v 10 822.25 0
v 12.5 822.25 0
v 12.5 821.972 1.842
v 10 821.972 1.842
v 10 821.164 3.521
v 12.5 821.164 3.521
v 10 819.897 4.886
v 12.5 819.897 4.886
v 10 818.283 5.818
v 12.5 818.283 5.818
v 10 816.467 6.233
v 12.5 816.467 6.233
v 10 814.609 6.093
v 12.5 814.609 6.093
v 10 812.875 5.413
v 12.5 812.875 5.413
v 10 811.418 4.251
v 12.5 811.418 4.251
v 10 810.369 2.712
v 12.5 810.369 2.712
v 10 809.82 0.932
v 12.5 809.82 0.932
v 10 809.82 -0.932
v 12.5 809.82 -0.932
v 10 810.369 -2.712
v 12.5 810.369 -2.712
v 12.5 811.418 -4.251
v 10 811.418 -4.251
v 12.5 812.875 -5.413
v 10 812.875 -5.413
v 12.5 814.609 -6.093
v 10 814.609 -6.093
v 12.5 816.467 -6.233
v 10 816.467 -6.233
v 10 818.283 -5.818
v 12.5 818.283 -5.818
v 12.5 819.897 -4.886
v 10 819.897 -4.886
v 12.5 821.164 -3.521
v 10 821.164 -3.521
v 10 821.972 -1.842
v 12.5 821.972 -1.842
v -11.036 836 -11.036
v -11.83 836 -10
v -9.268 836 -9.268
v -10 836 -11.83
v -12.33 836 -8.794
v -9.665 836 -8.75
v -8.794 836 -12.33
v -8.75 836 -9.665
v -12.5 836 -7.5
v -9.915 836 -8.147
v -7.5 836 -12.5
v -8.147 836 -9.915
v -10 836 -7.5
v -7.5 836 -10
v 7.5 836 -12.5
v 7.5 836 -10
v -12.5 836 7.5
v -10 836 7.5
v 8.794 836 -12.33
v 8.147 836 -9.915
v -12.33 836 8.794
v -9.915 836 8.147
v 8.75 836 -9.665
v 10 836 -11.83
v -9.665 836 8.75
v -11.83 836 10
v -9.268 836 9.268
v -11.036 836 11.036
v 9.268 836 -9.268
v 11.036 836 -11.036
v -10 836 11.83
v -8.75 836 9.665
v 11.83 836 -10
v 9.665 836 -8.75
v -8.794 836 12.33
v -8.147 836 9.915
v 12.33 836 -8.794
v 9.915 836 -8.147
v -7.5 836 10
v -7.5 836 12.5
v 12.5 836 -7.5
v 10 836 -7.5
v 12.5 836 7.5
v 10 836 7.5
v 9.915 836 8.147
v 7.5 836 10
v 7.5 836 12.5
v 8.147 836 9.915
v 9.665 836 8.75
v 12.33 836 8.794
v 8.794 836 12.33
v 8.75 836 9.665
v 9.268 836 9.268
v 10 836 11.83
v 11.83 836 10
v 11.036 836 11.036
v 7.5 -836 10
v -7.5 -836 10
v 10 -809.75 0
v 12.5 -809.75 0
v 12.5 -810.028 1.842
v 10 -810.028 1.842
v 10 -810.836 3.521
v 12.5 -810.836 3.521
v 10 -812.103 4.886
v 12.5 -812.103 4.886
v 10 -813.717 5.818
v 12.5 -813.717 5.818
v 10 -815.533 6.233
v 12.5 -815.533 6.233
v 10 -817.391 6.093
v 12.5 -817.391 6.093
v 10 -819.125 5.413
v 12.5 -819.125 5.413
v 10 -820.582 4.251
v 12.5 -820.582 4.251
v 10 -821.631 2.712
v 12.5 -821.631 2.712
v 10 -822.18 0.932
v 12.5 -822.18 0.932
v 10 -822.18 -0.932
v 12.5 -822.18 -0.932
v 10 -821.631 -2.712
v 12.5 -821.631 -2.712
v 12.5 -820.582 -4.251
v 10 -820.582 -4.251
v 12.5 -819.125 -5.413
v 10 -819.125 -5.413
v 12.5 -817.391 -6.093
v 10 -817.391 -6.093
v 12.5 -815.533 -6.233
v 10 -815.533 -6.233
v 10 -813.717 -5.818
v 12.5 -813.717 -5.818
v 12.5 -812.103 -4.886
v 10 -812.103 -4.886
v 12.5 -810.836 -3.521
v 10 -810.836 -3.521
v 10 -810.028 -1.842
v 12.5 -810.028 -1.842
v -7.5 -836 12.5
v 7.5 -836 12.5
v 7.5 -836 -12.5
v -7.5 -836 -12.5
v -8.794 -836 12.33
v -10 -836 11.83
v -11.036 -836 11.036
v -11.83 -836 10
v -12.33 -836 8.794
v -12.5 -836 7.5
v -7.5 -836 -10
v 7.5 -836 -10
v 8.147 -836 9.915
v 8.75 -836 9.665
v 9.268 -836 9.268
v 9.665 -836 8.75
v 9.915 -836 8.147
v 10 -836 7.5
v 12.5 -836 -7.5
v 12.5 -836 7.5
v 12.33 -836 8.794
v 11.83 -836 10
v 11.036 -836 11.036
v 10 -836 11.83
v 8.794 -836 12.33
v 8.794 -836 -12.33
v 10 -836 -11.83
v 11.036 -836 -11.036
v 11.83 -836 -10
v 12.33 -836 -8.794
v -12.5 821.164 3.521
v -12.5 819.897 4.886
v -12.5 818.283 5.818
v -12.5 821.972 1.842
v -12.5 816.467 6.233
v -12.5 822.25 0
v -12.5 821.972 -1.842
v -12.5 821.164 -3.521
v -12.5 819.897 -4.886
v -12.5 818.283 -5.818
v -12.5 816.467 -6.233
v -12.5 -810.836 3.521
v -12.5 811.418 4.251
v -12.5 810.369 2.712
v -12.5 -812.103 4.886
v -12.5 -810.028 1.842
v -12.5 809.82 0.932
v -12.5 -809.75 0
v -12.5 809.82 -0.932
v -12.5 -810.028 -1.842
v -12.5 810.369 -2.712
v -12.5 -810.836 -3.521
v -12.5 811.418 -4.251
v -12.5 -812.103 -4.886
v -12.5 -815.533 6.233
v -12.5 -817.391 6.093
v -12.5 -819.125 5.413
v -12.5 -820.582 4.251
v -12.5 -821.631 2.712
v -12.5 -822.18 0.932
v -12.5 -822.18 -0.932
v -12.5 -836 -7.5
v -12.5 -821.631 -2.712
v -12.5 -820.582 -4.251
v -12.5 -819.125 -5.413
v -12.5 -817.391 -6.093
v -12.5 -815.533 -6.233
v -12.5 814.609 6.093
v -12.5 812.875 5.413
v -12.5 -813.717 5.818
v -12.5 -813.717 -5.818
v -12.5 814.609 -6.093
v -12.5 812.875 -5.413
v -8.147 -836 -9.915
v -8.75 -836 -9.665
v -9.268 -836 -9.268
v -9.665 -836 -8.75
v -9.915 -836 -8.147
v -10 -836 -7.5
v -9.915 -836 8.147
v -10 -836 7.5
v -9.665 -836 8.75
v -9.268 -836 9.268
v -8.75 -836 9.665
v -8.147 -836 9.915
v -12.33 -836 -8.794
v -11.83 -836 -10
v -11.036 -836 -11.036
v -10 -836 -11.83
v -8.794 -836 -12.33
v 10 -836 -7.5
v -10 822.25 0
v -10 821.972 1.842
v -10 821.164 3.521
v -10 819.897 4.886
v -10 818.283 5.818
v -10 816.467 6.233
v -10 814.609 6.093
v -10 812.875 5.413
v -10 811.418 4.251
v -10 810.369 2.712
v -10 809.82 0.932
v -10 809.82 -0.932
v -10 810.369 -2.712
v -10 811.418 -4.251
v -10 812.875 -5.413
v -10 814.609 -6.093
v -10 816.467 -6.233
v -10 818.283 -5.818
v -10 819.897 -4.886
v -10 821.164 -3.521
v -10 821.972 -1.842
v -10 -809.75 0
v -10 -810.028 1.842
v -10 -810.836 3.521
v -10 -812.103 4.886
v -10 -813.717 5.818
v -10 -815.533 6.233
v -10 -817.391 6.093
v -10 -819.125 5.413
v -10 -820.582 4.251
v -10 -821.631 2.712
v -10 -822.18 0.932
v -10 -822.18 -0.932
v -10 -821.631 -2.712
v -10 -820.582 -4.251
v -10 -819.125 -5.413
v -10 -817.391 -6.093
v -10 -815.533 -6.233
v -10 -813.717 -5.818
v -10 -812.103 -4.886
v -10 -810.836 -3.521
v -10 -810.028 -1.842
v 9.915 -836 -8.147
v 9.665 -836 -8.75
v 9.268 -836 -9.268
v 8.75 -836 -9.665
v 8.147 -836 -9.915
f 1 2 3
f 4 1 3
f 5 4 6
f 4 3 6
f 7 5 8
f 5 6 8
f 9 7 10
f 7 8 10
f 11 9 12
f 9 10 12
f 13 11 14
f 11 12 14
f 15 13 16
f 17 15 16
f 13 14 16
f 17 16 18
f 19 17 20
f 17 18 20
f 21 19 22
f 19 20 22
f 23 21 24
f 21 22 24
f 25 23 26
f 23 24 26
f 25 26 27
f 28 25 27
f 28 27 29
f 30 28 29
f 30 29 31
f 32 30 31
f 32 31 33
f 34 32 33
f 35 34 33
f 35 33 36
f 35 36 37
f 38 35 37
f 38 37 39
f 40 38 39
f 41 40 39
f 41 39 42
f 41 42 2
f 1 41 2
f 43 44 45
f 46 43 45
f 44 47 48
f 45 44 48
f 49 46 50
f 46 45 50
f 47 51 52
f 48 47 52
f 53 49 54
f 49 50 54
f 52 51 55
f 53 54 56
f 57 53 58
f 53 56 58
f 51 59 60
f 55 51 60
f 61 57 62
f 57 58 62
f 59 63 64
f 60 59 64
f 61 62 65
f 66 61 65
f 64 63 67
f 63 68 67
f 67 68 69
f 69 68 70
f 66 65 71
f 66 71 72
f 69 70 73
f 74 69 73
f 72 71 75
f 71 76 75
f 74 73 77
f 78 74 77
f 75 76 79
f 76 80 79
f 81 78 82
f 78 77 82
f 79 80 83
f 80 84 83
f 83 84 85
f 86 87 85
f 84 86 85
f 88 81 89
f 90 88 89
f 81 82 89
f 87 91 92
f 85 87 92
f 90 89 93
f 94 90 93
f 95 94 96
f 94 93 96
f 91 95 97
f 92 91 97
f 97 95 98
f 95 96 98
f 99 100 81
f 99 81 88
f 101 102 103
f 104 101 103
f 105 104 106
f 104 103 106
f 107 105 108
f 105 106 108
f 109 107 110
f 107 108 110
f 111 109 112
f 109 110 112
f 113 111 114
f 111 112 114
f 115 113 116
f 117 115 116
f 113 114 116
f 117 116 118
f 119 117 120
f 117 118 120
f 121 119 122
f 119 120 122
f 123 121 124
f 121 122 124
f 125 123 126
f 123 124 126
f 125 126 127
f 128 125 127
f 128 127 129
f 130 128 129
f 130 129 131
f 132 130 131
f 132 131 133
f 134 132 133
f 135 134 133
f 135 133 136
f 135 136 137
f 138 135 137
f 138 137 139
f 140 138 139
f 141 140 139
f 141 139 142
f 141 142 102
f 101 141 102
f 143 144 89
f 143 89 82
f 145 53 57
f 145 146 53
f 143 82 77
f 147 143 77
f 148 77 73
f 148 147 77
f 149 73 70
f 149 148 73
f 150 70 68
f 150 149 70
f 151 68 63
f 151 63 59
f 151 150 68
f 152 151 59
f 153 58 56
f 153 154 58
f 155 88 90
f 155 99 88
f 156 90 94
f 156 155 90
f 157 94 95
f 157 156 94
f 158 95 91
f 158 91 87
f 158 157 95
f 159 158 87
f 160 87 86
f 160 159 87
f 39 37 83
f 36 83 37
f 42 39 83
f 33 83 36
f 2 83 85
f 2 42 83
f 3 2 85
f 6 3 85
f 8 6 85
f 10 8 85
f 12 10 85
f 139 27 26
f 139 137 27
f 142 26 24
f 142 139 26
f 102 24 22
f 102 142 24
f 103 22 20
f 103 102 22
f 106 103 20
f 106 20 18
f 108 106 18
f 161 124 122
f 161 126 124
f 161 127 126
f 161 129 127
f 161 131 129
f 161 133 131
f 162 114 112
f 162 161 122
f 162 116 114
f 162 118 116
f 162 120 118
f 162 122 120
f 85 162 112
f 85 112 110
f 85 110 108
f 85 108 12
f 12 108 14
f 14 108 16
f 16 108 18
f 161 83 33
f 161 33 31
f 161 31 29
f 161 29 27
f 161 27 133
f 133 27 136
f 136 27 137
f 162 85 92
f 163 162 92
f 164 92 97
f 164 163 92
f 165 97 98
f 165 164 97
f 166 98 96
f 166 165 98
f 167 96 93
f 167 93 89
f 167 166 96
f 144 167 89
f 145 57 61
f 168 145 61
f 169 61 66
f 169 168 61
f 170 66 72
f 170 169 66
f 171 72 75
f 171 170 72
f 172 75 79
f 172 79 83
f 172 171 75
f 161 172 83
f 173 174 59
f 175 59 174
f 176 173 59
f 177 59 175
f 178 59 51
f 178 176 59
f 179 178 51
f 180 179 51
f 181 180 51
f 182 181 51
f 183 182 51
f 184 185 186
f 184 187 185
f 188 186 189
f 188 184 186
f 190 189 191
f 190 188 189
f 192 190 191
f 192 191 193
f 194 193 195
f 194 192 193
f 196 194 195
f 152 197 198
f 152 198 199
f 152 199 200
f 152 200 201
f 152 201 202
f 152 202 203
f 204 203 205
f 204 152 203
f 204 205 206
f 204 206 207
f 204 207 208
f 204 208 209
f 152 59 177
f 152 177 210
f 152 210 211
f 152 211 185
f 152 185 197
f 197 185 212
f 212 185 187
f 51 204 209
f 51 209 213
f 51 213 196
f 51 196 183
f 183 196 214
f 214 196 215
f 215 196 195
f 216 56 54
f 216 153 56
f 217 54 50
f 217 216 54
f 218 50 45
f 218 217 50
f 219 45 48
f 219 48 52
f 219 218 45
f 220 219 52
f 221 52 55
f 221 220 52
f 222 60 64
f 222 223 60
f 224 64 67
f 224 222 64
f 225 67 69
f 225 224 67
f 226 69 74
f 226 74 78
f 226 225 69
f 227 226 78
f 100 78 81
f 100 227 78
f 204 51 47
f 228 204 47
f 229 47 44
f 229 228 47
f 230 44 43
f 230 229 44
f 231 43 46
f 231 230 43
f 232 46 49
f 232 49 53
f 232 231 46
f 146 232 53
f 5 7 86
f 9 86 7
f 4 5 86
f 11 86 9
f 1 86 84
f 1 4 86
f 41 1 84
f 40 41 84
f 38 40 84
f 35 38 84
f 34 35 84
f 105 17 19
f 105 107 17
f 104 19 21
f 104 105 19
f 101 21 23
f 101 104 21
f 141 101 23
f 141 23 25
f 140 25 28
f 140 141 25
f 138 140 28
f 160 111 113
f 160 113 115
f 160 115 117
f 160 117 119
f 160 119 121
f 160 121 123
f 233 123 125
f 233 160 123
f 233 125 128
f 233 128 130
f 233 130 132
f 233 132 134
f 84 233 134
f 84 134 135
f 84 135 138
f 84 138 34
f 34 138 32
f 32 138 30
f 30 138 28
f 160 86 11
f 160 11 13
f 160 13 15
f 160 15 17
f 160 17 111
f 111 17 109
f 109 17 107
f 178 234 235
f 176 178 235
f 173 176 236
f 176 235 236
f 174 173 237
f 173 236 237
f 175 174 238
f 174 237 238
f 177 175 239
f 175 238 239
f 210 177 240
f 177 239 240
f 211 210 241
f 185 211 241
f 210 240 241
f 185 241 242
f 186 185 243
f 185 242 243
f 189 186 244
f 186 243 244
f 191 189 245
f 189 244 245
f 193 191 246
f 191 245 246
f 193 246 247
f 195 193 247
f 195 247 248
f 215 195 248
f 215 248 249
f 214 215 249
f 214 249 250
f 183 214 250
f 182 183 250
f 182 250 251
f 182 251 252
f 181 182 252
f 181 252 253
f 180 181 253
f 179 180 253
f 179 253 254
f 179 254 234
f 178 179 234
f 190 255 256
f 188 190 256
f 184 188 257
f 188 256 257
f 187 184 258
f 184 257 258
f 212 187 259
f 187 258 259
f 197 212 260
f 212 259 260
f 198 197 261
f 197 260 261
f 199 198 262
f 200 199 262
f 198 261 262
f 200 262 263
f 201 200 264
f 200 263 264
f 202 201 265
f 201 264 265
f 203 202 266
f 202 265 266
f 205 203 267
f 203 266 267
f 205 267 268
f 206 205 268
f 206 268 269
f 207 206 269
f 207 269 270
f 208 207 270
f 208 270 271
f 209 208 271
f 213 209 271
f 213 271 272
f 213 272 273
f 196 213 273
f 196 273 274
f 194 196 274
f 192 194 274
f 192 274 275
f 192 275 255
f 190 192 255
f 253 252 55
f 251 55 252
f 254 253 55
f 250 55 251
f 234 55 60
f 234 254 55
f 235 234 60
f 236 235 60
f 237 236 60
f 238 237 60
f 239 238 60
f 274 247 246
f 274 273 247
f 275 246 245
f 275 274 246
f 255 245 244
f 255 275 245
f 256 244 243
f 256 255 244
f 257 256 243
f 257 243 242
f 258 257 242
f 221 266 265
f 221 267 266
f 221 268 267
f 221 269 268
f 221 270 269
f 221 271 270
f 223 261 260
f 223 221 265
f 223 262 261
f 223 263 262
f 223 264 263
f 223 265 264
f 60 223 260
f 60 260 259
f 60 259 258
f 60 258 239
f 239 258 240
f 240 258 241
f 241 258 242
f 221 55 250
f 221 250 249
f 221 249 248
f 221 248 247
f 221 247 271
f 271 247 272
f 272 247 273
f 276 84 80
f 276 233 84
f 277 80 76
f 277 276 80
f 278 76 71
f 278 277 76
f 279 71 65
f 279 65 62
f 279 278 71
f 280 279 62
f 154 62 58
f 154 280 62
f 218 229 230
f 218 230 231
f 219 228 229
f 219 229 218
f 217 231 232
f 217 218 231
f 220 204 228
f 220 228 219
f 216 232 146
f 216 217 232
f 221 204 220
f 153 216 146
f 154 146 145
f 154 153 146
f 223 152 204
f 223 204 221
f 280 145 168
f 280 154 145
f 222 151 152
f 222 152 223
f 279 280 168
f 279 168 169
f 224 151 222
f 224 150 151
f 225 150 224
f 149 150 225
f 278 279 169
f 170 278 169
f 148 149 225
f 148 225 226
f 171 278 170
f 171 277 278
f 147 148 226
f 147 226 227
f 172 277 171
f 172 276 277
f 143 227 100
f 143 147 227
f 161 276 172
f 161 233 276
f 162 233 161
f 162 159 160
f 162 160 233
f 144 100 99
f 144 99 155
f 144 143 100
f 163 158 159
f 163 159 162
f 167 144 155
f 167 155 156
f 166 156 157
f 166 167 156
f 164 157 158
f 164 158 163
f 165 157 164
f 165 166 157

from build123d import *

# Parameters (mm, degrees)
F1_DEPTH = 836
F2_R     = 6.25
F3_DEPTH = 25.001


with BuildPart() as f1:
    # F0 (on Front) → F1 (new body, symmetric)
    with BuildSketch(Plane.XZ):
        with BuildLine():
            ThreePointArc((12.5, 7.5), (11.035534, 11.035534), (7.5, 12.5))
            Line((7.5, 12.5), (-7.5, 12.5))
            ThreePointArc((-7.5, 12.5), (-11.035534, 11.035534), (-12.5, 7.5))
            Line((-12.5, 7.5), (-12.5, -7.5))
            ThreePointArc((-12.5, -7.5), (-11.035534, -11.035534), (-7.5, -12.5))
            Line((-7.5, -12.5), (7.5, -12.5))
            ThreePointArc((7.5, -12.5), (11.035534, -11.035534), (12.5, -7.5))
            Line((12.5, -7.5), (12.5, 7.5))
        make_face()
        with BuildLine():
            Line((-7.5, 10), (7.5, 10))
            ThreePointArc((7.5, 10), (9.267767, 9.267767), (10, 7.5))
            Line((10, 7.5), (10, -7.5))
            ThreePointArc((10, -7.5), (9.267767, -9.267767), (7.5, -10))
            Line((7.5, -10), (-7.5, -10))
            ThreePointArc((-7.5, -10), (-9.267767, -9.267767), (-10, -7.5))
            Line((-10, -7.5), (-10, 7.5))
            ThreePointArc((-10, 7.5), (-9.267767, 9.267767), (-7.5, 10))
        make_face(mode=Mode.SUBTRACT)
    extrude(amount=F1_DEPTH, both=True)

    # F2 (on face) → F3 (cut, through all)
    with BuildSketch(Plane.YZ.offset(12.5)):
        with Locations((-816, 0)):
            Circle(F2_R)
        with Locations((816, 0)):
            Circle(F2_R)
    extrude(amount=-F3_DEPTH, mode=Mode.SUBTRACT)


solid = f1.part
